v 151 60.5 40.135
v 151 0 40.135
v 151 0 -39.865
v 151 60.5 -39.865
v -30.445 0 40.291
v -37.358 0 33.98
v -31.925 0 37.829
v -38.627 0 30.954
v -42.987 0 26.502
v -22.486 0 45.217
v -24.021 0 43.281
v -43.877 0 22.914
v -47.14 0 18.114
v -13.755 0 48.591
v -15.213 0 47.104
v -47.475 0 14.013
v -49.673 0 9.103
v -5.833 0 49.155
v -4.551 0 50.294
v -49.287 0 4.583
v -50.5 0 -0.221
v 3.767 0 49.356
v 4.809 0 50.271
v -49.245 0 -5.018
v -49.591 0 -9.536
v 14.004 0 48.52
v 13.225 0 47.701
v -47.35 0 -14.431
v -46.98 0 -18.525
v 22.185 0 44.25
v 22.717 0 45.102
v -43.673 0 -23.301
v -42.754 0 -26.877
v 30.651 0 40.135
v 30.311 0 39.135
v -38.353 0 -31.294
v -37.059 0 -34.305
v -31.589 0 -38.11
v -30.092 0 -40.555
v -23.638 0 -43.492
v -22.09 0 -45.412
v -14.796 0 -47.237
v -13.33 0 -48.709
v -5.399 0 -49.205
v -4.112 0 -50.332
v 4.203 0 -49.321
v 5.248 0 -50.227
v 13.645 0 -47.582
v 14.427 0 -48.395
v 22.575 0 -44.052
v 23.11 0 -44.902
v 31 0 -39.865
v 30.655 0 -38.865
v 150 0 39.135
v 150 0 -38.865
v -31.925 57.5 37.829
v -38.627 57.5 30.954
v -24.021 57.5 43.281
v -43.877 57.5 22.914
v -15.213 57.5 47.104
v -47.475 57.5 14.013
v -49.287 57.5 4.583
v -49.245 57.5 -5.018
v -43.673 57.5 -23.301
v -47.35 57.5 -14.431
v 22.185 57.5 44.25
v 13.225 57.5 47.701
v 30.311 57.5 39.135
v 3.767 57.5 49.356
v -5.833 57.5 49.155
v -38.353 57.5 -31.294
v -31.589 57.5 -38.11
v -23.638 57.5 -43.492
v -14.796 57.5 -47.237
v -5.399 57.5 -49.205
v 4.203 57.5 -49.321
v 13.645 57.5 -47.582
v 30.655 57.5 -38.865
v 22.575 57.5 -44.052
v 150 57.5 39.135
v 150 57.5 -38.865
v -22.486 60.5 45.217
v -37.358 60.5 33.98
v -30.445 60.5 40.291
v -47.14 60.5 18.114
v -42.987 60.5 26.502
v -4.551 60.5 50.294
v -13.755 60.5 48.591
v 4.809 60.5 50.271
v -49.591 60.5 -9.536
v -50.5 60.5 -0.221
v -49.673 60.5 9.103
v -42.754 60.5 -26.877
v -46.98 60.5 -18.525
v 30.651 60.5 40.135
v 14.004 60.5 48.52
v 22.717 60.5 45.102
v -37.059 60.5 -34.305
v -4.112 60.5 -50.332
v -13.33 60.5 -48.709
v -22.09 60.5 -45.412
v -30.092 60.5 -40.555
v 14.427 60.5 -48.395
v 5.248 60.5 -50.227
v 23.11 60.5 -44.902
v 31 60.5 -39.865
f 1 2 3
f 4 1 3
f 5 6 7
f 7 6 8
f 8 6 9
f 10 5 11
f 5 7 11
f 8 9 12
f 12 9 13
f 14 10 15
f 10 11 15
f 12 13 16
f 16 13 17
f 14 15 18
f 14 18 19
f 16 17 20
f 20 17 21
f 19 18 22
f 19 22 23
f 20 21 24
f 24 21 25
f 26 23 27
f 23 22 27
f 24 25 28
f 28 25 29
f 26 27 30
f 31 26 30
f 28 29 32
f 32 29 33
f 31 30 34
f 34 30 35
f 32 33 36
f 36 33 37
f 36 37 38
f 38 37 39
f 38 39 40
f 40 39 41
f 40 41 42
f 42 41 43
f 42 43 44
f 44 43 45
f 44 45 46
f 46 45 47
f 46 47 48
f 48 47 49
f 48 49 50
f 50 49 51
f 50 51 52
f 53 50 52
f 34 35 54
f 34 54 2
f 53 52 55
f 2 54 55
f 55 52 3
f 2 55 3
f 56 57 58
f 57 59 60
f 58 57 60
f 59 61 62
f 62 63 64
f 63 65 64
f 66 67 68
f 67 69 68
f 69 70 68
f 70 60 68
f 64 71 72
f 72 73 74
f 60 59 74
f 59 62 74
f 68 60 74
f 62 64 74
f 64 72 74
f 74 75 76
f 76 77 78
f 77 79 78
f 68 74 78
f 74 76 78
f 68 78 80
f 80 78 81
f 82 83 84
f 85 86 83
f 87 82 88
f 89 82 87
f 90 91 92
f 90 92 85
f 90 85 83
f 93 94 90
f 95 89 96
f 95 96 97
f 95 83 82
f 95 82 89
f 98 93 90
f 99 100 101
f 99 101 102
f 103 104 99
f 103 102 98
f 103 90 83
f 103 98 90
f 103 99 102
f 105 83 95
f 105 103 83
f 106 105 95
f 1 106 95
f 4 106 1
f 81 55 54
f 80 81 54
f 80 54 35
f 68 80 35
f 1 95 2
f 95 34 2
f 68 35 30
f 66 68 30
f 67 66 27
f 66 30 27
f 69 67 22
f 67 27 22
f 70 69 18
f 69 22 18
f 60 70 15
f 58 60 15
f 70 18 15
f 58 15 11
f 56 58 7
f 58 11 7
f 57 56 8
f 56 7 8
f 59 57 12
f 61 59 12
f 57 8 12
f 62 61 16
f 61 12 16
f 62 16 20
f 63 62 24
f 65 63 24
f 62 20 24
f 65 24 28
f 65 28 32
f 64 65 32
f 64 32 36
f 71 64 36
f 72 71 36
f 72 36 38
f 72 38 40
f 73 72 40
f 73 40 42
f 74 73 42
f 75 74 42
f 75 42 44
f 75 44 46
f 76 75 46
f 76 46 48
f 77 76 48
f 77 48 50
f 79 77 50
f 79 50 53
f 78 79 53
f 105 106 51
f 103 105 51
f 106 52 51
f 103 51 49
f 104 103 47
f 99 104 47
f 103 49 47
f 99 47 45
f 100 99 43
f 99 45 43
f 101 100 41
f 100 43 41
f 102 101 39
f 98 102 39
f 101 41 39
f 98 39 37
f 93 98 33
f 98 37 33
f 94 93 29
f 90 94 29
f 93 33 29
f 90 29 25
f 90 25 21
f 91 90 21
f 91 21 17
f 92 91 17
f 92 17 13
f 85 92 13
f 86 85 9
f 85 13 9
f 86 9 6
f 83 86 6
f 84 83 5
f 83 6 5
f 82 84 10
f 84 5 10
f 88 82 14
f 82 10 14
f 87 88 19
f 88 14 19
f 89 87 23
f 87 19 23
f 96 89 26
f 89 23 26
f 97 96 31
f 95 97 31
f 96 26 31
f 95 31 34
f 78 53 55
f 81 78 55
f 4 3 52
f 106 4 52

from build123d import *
from build123d.topology import SkipClean

# Parameters (mm, degrees)
SALIENTE_EXTRUIR1_DEPTH = 65
SALIENTE_EXTRUIR2_DEPTH = 2.5
CROQUIS4_W              = 101
CROQUIS4_H              = 10
CORTAR_EXTRUIR1_DEPTH   = 250
SALIENTE_EXTRUIR3_DEPTH = 3


with BuildPart() as part:
    # Croquis2 → Saliente-Extruir1 (new body)
    with BuildSketch(Plane(origin=(0, 0, 0), x_dir=(1, 0, 0), z_dir=(0, 1, 0))):
        with BuildLine():
            Line((151, 39.865398531), (31, 39.865398531))
            ThreePointArc((31, 39.865398531), (-50.499518563, 0.220510468), (30.650673156, -40.134601469))
            Line((30.650673156, -40.134601469), (151, -40.134601469))
            Line((151, -40.134601469), (151, 39.865398531))
        make_face()
        with BuildLine():
            Line((30.655028903, 38.865398531), (150, 38.865398531))
            Line((150, 38.865398531), (150, -39.134601469))
            Line((150, -39.134601469), (30.310608173, -39.134601469))
            ThreePointArc((30.310608173, -39.134601469), (-49.499517432, 0.218572563), (30.655028903, 38.865398531))
        make_face(mode=Mode.SUBTRACT)
    extrude(amount=SALIENTE_EXTRUIR1_DEPTH)

    # Croquis3 → Saliente-Extruir2 (add)
    with SkipClean():  # the faces are left unmerged after this step: merging them gives an invalid solid
        with BuildSketch(Plane(origin=(0, 65, 0), x_dir=(1, 0, 0), z_dir=(0, 1, 0))):
            with BuildLine():
                Line((151, 39.865398531), (151, -40.134601469))
                Line((151, -40.134601469), (30.650673156, -40.134601469))
                ThreePointArc((30.650673156, -40.134601469), (-50.499518563, 0.220510468), (31, 39.865398531))
                Line((31, 39.865398531), (151, 39.865398531))
            make_face()
        extrude(amount=SALIENTE_EXTRUIR2_DEPTH)

    # Croquis4 → Cortar-Extruir1 (cut)
    with BuildSketch(Plane(origin=(151, 0, 0), x_dir=(0, 0, -1), z_dir=(1, 0, 0))):
        with Locations((0, 62.5)):
            Rectangle(CROQUIS4_W, CROQUIS4_H)
    extrude(amount=-CORTAR_EXTRUIR1_DEPTH, mode=Mode.SUBTRACT)

    # Croquis5 → Saliente-Extruir3 (add)
    with BuildSketch(Plane(origin=(0, 57.5, 0), x_dir=(1, 0, 0), z_dir=(0, 1, 0))):
        with BuildLine():
            Line((151, 39.865398531), (31, 39.865398531))
            ThreePointArc((31, 39.865398531), (-50.499518563, 0.220510468), (30.650673156, -40.134601469))
            Line((30.650673156, -40.134601469), (151, -40.134601469))
            Line((151, -40.134601469), (151, 39.865398531))
        make_face()
    extrude(amount=SALIENTE_EXTRUIR3_DEPTH)


solid = part.part
